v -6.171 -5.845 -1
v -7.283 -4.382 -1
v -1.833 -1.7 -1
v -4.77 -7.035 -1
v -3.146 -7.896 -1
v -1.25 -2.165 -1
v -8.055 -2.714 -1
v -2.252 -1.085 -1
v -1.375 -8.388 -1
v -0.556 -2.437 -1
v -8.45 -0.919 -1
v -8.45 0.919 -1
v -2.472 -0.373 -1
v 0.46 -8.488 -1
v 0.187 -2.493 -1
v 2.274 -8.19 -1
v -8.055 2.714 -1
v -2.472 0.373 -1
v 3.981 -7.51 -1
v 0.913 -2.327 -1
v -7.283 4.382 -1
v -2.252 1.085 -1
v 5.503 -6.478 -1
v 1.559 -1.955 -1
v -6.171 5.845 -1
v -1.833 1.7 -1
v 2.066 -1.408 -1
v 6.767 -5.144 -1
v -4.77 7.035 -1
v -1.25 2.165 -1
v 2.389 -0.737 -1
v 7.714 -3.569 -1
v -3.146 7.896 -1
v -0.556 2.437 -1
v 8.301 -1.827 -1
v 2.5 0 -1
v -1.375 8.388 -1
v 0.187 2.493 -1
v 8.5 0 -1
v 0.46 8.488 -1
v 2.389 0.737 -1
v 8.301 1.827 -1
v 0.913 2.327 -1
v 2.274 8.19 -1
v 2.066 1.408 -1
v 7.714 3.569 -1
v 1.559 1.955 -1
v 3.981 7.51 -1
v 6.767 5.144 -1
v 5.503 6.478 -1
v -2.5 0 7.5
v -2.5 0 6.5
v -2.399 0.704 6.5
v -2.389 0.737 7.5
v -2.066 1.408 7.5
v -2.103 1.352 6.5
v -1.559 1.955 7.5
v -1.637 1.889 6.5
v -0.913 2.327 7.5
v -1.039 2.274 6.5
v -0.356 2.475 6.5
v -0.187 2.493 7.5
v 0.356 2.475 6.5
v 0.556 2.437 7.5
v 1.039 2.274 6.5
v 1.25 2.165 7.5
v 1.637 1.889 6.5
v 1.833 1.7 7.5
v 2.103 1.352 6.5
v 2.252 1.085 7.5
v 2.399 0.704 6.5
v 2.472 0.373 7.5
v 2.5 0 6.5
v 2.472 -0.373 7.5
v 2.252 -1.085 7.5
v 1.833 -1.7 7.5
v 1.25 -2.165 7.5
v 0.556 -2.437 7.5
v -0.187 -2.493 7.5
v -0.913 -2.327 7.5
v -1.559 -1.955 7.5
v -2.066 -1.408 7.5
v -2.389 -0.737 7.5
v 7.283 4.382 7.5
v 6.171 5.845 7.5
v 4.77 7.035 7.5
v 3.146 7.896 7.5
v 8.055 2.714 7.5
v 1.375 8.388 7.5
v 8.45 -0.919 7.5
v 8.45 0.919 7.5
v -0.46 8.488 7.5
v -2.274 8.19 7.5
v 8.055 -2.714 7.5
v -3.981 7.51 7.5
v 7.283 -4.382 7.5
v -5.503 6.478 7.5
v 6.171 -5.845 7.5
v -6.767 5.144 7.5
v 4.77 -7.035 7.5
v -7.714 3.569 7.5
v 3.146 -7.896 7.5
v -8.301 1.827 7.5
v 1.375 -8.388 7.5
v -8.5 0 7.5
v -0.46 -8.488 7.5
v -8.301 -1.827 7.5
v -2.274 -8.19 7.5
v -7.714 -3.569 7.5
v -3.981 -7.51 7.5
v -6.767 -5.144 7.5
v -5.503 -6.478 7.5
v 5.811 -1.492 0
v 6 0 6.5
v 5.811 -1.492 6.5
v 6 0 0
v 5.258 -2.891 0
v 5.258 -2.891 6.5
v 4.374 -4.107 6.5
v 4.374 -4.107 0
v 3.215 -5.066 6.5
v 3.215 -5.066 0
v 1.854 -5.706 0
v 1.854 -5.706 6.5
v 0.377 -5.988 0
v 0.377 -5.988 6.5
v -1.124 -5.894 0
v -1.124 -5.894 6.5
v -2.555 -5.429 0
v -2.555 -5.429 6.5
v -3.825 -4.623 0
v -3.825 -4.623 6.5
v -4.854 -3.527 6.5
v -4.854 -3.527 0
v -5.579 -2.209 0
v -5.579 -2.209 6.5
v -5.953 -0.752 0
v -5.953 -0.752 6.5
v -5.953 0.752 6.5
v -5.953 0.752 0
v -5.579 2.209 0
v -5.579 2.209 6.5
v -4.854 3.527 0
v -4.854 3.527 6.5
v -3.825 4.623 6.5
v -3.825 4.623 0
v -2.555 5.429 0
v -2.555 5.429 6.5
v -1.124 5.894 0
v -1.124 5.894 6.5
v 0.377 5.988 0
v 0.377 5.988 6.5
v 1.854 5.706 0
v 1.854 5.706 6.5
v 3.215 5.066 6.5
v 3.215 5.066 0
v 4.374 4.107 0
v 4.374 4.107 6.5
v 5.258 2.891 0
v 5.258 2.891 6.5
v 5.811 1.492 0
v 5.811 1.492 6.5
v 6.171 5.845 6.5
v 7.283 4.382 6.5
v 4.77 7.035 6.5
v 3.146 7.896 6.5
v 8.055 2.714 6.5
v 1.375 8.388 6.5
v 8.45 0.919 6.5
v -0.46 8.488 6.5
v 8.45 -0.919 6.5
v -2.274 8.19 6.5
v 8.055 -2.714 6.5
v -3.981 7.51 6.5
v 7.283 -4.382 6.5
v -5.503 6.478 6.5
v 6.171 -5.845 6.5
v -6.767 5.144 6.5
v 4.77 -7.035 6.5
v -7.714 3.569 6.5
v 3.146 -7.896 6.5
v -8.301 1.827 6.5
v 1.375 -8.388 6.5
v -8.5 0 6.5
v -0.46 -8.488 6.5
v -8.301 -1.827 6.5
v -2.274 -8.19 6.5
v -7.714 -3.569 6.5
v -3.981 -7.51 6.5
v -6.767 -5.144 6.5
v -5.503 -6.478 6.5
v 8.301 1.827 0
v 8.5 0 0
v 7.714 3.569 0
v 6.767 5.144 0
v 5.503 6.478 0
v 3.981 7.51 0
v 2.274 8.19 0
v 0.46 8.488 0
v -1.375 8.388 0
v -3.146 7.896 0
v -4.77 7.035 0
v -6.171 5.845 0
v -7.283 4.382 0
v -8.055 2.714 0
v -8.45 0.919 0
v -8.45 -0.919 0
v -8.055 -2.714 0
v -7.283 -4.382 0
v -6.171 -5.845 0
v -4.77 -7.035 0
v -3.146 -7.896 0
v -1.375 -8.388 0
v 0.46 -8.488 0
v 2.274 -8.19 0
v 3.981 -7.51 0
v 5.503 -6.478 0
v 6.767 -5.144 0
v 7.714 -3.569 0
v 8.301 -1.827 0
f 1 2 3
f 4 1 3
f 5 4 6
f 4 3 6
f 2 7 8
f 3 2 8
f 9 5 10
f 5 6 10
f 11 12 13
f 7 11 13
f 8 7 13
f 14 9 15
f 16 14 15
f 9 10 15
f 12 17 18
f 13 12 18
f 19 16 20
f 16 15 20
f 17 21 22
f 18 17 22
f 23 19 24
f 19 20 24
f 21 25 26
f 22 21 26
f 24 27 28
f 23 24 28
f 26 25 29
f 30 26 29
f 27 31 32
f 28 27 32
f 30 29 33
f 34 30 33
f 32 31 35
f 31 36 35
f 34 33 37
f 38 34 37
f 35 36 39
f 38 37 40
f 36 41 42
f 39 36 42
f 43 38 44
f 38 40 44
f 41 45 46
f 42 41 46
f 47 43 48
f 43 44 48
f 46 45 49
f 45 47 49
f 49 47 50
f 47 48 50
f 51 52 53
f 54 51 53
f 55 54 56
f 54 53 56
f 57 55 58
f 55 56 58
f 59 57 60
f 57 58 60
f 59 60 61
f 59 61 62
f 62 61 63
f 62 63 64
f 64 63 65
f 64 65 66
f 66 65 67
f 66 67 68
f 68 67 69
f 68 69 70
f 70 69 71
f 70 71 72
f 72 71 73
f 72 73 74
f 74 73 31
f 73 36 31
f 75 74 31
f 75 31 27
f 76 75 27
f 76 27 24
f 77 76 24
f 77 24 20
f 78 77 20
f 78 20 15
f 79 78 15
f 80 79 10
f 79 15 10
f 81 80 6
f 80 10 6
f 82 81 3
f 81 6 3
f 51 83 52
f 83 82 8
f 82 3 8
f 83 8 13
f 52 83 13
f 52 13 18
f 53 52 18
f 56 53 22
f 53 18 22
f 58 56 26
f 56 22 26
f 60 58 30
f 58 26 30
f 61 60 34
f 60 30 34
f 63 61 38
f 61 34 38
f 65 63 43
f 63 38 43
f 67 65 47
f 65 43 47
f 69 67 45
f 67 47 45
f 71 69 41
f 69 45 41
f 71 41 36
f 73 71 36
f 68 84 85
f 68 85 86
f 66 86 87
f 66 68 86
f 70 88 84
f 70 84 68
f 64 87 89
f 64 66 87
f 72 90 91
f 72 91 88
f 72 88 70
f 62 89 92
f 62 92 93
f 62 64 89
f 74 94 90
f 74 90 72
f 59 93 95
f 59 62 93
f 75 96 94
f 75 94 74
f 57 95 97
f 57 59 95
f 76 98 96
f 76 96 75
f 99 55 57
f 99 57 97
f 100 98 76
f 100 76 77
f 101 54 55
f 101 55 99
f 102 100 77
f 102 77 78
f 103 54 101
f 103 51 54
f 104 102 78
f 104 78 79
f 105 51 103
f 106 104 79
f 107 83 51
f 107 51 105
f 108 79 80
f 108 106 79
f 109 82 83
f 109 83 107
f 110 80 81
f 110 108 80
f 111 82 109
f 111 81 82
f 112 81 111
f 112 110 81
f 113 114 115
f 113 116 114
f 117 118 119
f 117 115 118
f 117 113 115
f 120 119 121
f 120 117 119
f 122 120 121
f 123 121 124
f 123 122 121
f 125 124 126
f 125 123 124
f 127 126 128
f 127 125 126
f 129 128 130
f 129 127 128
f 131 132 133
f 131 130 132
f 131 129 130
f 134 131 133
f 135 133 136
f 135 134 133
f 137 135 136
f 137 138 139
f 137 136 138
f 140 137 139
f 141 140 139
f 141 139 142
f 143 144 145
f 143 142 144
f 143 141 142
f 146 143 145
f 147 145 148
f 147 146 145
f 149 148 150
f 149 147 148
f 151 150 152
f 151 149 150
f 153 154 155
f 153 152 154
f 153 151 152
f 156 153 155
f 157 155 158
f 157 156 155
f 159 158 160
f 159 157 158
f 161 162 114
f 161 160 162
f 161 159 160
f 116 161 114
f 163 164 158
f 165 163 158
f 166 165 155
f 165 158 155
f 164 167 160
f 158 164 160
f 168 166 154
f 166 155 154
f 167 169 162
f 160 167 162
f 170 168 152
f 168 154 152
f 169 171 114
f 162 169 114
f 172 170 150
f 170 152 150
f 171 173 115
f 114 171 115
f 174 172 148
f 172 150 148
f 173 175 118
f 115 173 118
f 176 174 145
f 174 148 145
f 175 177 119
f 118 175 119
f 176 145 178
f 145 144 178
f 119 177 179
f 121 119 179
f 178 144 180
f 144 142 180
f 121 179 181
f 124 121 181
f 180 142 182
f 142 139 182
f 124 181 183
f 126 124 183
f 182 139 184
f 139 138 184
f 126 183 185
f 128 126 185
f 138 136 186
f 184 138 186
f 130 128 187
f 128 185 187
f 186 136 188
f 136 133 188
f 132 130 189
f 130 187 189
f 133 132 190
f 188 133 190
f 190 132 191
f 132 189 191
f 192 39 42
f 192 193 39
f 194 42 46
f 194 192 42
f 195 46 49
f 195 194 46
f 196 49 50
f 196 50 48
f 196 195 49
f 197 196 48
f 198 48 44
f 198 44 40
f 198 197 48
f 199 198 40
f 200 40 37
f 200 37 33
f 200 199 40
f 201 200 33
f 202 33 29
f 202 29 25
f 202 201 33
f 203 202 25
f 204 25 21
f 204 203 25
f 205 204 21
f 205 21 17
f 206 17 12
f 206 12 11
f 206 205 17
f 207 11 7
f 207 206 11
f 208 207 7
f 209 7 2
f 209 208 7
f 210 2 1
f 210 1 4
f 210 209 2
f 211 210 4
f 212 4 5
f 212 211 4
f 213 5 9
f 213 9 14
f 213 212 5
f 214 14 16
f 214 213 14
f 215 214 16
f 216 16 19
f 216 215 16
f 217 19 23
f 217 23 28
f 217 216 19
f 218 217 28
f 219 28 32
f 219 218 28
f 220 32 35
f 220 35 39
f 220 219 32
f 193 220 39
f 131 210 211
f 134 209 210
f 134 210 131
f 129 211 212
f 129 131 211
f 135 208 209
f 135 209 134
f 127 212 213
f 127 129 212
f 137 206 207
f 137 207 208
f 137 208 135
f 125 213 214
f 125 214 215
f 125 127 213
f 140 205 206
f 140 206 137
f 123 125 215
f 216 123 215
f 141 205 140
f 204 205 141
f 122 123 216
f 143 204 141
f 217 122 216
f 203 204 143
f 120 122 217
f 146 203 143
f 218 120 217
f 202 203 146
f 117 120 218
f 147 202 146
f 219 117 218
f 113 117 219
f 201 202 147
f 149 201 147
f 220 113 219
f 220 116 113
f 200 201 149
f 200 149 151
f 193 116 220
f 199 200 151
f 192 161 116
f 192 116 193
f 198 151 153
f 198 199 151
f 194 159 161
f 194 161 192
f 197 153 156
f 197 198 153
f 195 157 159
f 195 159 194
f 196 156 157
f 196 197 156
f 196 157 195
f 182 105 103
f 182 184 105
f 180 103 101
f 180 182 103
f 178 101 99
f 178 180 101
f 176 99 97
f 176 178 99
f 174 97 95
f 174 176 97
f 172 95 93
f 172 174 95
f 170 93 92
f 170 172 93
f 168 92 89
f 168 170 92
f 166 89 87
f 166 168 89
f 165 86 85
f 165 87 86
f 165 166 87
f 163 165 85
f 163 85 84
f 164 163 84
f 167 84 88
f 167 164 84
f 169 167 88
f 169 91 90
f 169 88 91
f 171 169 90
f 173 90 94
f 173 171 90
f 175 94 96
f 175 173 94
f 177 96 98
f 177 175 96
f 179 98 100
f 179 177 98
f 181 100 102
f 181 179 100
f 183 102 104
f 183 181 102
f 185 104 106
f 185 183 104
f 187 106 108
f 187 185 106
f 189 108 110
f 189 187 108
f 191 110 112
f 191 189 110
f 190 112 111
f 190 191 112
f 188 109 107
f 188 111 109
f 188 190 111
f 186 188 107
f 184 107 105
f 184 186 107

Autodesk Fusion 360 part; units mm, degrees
sketch "Sketch1" plane through (0, 0, 0) normal (0, 0, 1) x (1, 0, 0)
  circle A0 centre (0, 0) radius 6
  circle A1 centre (0, 0) radius 8.5
  circle A2 centre (0, 0) radius 2.5
  dimension "d1" = 12
  dimension "d2" = 17
  dimension "d3" = 5
extrude "Extrude1" add sketch "Sketch1" along normal blind 6.5 contours A0
extrude "Extrude2" add sketch "Sketch1" against normal blind 1 contours A0 | A1
sketch "Sketch2" plane through (0, 0, 6.5) normal (0, 0, 1) x (-1, 0, 0)
  circle A0 centre (0, 0) radius 2.5
  circle A1 centre (0, 0) radius 6
  circle A2 centre (0, 0) radius 8.5
  dimension "d8" = 17
extrude "Extrude3" add sketch "Sketch2" along normal blind 1 contours A1 | A2
